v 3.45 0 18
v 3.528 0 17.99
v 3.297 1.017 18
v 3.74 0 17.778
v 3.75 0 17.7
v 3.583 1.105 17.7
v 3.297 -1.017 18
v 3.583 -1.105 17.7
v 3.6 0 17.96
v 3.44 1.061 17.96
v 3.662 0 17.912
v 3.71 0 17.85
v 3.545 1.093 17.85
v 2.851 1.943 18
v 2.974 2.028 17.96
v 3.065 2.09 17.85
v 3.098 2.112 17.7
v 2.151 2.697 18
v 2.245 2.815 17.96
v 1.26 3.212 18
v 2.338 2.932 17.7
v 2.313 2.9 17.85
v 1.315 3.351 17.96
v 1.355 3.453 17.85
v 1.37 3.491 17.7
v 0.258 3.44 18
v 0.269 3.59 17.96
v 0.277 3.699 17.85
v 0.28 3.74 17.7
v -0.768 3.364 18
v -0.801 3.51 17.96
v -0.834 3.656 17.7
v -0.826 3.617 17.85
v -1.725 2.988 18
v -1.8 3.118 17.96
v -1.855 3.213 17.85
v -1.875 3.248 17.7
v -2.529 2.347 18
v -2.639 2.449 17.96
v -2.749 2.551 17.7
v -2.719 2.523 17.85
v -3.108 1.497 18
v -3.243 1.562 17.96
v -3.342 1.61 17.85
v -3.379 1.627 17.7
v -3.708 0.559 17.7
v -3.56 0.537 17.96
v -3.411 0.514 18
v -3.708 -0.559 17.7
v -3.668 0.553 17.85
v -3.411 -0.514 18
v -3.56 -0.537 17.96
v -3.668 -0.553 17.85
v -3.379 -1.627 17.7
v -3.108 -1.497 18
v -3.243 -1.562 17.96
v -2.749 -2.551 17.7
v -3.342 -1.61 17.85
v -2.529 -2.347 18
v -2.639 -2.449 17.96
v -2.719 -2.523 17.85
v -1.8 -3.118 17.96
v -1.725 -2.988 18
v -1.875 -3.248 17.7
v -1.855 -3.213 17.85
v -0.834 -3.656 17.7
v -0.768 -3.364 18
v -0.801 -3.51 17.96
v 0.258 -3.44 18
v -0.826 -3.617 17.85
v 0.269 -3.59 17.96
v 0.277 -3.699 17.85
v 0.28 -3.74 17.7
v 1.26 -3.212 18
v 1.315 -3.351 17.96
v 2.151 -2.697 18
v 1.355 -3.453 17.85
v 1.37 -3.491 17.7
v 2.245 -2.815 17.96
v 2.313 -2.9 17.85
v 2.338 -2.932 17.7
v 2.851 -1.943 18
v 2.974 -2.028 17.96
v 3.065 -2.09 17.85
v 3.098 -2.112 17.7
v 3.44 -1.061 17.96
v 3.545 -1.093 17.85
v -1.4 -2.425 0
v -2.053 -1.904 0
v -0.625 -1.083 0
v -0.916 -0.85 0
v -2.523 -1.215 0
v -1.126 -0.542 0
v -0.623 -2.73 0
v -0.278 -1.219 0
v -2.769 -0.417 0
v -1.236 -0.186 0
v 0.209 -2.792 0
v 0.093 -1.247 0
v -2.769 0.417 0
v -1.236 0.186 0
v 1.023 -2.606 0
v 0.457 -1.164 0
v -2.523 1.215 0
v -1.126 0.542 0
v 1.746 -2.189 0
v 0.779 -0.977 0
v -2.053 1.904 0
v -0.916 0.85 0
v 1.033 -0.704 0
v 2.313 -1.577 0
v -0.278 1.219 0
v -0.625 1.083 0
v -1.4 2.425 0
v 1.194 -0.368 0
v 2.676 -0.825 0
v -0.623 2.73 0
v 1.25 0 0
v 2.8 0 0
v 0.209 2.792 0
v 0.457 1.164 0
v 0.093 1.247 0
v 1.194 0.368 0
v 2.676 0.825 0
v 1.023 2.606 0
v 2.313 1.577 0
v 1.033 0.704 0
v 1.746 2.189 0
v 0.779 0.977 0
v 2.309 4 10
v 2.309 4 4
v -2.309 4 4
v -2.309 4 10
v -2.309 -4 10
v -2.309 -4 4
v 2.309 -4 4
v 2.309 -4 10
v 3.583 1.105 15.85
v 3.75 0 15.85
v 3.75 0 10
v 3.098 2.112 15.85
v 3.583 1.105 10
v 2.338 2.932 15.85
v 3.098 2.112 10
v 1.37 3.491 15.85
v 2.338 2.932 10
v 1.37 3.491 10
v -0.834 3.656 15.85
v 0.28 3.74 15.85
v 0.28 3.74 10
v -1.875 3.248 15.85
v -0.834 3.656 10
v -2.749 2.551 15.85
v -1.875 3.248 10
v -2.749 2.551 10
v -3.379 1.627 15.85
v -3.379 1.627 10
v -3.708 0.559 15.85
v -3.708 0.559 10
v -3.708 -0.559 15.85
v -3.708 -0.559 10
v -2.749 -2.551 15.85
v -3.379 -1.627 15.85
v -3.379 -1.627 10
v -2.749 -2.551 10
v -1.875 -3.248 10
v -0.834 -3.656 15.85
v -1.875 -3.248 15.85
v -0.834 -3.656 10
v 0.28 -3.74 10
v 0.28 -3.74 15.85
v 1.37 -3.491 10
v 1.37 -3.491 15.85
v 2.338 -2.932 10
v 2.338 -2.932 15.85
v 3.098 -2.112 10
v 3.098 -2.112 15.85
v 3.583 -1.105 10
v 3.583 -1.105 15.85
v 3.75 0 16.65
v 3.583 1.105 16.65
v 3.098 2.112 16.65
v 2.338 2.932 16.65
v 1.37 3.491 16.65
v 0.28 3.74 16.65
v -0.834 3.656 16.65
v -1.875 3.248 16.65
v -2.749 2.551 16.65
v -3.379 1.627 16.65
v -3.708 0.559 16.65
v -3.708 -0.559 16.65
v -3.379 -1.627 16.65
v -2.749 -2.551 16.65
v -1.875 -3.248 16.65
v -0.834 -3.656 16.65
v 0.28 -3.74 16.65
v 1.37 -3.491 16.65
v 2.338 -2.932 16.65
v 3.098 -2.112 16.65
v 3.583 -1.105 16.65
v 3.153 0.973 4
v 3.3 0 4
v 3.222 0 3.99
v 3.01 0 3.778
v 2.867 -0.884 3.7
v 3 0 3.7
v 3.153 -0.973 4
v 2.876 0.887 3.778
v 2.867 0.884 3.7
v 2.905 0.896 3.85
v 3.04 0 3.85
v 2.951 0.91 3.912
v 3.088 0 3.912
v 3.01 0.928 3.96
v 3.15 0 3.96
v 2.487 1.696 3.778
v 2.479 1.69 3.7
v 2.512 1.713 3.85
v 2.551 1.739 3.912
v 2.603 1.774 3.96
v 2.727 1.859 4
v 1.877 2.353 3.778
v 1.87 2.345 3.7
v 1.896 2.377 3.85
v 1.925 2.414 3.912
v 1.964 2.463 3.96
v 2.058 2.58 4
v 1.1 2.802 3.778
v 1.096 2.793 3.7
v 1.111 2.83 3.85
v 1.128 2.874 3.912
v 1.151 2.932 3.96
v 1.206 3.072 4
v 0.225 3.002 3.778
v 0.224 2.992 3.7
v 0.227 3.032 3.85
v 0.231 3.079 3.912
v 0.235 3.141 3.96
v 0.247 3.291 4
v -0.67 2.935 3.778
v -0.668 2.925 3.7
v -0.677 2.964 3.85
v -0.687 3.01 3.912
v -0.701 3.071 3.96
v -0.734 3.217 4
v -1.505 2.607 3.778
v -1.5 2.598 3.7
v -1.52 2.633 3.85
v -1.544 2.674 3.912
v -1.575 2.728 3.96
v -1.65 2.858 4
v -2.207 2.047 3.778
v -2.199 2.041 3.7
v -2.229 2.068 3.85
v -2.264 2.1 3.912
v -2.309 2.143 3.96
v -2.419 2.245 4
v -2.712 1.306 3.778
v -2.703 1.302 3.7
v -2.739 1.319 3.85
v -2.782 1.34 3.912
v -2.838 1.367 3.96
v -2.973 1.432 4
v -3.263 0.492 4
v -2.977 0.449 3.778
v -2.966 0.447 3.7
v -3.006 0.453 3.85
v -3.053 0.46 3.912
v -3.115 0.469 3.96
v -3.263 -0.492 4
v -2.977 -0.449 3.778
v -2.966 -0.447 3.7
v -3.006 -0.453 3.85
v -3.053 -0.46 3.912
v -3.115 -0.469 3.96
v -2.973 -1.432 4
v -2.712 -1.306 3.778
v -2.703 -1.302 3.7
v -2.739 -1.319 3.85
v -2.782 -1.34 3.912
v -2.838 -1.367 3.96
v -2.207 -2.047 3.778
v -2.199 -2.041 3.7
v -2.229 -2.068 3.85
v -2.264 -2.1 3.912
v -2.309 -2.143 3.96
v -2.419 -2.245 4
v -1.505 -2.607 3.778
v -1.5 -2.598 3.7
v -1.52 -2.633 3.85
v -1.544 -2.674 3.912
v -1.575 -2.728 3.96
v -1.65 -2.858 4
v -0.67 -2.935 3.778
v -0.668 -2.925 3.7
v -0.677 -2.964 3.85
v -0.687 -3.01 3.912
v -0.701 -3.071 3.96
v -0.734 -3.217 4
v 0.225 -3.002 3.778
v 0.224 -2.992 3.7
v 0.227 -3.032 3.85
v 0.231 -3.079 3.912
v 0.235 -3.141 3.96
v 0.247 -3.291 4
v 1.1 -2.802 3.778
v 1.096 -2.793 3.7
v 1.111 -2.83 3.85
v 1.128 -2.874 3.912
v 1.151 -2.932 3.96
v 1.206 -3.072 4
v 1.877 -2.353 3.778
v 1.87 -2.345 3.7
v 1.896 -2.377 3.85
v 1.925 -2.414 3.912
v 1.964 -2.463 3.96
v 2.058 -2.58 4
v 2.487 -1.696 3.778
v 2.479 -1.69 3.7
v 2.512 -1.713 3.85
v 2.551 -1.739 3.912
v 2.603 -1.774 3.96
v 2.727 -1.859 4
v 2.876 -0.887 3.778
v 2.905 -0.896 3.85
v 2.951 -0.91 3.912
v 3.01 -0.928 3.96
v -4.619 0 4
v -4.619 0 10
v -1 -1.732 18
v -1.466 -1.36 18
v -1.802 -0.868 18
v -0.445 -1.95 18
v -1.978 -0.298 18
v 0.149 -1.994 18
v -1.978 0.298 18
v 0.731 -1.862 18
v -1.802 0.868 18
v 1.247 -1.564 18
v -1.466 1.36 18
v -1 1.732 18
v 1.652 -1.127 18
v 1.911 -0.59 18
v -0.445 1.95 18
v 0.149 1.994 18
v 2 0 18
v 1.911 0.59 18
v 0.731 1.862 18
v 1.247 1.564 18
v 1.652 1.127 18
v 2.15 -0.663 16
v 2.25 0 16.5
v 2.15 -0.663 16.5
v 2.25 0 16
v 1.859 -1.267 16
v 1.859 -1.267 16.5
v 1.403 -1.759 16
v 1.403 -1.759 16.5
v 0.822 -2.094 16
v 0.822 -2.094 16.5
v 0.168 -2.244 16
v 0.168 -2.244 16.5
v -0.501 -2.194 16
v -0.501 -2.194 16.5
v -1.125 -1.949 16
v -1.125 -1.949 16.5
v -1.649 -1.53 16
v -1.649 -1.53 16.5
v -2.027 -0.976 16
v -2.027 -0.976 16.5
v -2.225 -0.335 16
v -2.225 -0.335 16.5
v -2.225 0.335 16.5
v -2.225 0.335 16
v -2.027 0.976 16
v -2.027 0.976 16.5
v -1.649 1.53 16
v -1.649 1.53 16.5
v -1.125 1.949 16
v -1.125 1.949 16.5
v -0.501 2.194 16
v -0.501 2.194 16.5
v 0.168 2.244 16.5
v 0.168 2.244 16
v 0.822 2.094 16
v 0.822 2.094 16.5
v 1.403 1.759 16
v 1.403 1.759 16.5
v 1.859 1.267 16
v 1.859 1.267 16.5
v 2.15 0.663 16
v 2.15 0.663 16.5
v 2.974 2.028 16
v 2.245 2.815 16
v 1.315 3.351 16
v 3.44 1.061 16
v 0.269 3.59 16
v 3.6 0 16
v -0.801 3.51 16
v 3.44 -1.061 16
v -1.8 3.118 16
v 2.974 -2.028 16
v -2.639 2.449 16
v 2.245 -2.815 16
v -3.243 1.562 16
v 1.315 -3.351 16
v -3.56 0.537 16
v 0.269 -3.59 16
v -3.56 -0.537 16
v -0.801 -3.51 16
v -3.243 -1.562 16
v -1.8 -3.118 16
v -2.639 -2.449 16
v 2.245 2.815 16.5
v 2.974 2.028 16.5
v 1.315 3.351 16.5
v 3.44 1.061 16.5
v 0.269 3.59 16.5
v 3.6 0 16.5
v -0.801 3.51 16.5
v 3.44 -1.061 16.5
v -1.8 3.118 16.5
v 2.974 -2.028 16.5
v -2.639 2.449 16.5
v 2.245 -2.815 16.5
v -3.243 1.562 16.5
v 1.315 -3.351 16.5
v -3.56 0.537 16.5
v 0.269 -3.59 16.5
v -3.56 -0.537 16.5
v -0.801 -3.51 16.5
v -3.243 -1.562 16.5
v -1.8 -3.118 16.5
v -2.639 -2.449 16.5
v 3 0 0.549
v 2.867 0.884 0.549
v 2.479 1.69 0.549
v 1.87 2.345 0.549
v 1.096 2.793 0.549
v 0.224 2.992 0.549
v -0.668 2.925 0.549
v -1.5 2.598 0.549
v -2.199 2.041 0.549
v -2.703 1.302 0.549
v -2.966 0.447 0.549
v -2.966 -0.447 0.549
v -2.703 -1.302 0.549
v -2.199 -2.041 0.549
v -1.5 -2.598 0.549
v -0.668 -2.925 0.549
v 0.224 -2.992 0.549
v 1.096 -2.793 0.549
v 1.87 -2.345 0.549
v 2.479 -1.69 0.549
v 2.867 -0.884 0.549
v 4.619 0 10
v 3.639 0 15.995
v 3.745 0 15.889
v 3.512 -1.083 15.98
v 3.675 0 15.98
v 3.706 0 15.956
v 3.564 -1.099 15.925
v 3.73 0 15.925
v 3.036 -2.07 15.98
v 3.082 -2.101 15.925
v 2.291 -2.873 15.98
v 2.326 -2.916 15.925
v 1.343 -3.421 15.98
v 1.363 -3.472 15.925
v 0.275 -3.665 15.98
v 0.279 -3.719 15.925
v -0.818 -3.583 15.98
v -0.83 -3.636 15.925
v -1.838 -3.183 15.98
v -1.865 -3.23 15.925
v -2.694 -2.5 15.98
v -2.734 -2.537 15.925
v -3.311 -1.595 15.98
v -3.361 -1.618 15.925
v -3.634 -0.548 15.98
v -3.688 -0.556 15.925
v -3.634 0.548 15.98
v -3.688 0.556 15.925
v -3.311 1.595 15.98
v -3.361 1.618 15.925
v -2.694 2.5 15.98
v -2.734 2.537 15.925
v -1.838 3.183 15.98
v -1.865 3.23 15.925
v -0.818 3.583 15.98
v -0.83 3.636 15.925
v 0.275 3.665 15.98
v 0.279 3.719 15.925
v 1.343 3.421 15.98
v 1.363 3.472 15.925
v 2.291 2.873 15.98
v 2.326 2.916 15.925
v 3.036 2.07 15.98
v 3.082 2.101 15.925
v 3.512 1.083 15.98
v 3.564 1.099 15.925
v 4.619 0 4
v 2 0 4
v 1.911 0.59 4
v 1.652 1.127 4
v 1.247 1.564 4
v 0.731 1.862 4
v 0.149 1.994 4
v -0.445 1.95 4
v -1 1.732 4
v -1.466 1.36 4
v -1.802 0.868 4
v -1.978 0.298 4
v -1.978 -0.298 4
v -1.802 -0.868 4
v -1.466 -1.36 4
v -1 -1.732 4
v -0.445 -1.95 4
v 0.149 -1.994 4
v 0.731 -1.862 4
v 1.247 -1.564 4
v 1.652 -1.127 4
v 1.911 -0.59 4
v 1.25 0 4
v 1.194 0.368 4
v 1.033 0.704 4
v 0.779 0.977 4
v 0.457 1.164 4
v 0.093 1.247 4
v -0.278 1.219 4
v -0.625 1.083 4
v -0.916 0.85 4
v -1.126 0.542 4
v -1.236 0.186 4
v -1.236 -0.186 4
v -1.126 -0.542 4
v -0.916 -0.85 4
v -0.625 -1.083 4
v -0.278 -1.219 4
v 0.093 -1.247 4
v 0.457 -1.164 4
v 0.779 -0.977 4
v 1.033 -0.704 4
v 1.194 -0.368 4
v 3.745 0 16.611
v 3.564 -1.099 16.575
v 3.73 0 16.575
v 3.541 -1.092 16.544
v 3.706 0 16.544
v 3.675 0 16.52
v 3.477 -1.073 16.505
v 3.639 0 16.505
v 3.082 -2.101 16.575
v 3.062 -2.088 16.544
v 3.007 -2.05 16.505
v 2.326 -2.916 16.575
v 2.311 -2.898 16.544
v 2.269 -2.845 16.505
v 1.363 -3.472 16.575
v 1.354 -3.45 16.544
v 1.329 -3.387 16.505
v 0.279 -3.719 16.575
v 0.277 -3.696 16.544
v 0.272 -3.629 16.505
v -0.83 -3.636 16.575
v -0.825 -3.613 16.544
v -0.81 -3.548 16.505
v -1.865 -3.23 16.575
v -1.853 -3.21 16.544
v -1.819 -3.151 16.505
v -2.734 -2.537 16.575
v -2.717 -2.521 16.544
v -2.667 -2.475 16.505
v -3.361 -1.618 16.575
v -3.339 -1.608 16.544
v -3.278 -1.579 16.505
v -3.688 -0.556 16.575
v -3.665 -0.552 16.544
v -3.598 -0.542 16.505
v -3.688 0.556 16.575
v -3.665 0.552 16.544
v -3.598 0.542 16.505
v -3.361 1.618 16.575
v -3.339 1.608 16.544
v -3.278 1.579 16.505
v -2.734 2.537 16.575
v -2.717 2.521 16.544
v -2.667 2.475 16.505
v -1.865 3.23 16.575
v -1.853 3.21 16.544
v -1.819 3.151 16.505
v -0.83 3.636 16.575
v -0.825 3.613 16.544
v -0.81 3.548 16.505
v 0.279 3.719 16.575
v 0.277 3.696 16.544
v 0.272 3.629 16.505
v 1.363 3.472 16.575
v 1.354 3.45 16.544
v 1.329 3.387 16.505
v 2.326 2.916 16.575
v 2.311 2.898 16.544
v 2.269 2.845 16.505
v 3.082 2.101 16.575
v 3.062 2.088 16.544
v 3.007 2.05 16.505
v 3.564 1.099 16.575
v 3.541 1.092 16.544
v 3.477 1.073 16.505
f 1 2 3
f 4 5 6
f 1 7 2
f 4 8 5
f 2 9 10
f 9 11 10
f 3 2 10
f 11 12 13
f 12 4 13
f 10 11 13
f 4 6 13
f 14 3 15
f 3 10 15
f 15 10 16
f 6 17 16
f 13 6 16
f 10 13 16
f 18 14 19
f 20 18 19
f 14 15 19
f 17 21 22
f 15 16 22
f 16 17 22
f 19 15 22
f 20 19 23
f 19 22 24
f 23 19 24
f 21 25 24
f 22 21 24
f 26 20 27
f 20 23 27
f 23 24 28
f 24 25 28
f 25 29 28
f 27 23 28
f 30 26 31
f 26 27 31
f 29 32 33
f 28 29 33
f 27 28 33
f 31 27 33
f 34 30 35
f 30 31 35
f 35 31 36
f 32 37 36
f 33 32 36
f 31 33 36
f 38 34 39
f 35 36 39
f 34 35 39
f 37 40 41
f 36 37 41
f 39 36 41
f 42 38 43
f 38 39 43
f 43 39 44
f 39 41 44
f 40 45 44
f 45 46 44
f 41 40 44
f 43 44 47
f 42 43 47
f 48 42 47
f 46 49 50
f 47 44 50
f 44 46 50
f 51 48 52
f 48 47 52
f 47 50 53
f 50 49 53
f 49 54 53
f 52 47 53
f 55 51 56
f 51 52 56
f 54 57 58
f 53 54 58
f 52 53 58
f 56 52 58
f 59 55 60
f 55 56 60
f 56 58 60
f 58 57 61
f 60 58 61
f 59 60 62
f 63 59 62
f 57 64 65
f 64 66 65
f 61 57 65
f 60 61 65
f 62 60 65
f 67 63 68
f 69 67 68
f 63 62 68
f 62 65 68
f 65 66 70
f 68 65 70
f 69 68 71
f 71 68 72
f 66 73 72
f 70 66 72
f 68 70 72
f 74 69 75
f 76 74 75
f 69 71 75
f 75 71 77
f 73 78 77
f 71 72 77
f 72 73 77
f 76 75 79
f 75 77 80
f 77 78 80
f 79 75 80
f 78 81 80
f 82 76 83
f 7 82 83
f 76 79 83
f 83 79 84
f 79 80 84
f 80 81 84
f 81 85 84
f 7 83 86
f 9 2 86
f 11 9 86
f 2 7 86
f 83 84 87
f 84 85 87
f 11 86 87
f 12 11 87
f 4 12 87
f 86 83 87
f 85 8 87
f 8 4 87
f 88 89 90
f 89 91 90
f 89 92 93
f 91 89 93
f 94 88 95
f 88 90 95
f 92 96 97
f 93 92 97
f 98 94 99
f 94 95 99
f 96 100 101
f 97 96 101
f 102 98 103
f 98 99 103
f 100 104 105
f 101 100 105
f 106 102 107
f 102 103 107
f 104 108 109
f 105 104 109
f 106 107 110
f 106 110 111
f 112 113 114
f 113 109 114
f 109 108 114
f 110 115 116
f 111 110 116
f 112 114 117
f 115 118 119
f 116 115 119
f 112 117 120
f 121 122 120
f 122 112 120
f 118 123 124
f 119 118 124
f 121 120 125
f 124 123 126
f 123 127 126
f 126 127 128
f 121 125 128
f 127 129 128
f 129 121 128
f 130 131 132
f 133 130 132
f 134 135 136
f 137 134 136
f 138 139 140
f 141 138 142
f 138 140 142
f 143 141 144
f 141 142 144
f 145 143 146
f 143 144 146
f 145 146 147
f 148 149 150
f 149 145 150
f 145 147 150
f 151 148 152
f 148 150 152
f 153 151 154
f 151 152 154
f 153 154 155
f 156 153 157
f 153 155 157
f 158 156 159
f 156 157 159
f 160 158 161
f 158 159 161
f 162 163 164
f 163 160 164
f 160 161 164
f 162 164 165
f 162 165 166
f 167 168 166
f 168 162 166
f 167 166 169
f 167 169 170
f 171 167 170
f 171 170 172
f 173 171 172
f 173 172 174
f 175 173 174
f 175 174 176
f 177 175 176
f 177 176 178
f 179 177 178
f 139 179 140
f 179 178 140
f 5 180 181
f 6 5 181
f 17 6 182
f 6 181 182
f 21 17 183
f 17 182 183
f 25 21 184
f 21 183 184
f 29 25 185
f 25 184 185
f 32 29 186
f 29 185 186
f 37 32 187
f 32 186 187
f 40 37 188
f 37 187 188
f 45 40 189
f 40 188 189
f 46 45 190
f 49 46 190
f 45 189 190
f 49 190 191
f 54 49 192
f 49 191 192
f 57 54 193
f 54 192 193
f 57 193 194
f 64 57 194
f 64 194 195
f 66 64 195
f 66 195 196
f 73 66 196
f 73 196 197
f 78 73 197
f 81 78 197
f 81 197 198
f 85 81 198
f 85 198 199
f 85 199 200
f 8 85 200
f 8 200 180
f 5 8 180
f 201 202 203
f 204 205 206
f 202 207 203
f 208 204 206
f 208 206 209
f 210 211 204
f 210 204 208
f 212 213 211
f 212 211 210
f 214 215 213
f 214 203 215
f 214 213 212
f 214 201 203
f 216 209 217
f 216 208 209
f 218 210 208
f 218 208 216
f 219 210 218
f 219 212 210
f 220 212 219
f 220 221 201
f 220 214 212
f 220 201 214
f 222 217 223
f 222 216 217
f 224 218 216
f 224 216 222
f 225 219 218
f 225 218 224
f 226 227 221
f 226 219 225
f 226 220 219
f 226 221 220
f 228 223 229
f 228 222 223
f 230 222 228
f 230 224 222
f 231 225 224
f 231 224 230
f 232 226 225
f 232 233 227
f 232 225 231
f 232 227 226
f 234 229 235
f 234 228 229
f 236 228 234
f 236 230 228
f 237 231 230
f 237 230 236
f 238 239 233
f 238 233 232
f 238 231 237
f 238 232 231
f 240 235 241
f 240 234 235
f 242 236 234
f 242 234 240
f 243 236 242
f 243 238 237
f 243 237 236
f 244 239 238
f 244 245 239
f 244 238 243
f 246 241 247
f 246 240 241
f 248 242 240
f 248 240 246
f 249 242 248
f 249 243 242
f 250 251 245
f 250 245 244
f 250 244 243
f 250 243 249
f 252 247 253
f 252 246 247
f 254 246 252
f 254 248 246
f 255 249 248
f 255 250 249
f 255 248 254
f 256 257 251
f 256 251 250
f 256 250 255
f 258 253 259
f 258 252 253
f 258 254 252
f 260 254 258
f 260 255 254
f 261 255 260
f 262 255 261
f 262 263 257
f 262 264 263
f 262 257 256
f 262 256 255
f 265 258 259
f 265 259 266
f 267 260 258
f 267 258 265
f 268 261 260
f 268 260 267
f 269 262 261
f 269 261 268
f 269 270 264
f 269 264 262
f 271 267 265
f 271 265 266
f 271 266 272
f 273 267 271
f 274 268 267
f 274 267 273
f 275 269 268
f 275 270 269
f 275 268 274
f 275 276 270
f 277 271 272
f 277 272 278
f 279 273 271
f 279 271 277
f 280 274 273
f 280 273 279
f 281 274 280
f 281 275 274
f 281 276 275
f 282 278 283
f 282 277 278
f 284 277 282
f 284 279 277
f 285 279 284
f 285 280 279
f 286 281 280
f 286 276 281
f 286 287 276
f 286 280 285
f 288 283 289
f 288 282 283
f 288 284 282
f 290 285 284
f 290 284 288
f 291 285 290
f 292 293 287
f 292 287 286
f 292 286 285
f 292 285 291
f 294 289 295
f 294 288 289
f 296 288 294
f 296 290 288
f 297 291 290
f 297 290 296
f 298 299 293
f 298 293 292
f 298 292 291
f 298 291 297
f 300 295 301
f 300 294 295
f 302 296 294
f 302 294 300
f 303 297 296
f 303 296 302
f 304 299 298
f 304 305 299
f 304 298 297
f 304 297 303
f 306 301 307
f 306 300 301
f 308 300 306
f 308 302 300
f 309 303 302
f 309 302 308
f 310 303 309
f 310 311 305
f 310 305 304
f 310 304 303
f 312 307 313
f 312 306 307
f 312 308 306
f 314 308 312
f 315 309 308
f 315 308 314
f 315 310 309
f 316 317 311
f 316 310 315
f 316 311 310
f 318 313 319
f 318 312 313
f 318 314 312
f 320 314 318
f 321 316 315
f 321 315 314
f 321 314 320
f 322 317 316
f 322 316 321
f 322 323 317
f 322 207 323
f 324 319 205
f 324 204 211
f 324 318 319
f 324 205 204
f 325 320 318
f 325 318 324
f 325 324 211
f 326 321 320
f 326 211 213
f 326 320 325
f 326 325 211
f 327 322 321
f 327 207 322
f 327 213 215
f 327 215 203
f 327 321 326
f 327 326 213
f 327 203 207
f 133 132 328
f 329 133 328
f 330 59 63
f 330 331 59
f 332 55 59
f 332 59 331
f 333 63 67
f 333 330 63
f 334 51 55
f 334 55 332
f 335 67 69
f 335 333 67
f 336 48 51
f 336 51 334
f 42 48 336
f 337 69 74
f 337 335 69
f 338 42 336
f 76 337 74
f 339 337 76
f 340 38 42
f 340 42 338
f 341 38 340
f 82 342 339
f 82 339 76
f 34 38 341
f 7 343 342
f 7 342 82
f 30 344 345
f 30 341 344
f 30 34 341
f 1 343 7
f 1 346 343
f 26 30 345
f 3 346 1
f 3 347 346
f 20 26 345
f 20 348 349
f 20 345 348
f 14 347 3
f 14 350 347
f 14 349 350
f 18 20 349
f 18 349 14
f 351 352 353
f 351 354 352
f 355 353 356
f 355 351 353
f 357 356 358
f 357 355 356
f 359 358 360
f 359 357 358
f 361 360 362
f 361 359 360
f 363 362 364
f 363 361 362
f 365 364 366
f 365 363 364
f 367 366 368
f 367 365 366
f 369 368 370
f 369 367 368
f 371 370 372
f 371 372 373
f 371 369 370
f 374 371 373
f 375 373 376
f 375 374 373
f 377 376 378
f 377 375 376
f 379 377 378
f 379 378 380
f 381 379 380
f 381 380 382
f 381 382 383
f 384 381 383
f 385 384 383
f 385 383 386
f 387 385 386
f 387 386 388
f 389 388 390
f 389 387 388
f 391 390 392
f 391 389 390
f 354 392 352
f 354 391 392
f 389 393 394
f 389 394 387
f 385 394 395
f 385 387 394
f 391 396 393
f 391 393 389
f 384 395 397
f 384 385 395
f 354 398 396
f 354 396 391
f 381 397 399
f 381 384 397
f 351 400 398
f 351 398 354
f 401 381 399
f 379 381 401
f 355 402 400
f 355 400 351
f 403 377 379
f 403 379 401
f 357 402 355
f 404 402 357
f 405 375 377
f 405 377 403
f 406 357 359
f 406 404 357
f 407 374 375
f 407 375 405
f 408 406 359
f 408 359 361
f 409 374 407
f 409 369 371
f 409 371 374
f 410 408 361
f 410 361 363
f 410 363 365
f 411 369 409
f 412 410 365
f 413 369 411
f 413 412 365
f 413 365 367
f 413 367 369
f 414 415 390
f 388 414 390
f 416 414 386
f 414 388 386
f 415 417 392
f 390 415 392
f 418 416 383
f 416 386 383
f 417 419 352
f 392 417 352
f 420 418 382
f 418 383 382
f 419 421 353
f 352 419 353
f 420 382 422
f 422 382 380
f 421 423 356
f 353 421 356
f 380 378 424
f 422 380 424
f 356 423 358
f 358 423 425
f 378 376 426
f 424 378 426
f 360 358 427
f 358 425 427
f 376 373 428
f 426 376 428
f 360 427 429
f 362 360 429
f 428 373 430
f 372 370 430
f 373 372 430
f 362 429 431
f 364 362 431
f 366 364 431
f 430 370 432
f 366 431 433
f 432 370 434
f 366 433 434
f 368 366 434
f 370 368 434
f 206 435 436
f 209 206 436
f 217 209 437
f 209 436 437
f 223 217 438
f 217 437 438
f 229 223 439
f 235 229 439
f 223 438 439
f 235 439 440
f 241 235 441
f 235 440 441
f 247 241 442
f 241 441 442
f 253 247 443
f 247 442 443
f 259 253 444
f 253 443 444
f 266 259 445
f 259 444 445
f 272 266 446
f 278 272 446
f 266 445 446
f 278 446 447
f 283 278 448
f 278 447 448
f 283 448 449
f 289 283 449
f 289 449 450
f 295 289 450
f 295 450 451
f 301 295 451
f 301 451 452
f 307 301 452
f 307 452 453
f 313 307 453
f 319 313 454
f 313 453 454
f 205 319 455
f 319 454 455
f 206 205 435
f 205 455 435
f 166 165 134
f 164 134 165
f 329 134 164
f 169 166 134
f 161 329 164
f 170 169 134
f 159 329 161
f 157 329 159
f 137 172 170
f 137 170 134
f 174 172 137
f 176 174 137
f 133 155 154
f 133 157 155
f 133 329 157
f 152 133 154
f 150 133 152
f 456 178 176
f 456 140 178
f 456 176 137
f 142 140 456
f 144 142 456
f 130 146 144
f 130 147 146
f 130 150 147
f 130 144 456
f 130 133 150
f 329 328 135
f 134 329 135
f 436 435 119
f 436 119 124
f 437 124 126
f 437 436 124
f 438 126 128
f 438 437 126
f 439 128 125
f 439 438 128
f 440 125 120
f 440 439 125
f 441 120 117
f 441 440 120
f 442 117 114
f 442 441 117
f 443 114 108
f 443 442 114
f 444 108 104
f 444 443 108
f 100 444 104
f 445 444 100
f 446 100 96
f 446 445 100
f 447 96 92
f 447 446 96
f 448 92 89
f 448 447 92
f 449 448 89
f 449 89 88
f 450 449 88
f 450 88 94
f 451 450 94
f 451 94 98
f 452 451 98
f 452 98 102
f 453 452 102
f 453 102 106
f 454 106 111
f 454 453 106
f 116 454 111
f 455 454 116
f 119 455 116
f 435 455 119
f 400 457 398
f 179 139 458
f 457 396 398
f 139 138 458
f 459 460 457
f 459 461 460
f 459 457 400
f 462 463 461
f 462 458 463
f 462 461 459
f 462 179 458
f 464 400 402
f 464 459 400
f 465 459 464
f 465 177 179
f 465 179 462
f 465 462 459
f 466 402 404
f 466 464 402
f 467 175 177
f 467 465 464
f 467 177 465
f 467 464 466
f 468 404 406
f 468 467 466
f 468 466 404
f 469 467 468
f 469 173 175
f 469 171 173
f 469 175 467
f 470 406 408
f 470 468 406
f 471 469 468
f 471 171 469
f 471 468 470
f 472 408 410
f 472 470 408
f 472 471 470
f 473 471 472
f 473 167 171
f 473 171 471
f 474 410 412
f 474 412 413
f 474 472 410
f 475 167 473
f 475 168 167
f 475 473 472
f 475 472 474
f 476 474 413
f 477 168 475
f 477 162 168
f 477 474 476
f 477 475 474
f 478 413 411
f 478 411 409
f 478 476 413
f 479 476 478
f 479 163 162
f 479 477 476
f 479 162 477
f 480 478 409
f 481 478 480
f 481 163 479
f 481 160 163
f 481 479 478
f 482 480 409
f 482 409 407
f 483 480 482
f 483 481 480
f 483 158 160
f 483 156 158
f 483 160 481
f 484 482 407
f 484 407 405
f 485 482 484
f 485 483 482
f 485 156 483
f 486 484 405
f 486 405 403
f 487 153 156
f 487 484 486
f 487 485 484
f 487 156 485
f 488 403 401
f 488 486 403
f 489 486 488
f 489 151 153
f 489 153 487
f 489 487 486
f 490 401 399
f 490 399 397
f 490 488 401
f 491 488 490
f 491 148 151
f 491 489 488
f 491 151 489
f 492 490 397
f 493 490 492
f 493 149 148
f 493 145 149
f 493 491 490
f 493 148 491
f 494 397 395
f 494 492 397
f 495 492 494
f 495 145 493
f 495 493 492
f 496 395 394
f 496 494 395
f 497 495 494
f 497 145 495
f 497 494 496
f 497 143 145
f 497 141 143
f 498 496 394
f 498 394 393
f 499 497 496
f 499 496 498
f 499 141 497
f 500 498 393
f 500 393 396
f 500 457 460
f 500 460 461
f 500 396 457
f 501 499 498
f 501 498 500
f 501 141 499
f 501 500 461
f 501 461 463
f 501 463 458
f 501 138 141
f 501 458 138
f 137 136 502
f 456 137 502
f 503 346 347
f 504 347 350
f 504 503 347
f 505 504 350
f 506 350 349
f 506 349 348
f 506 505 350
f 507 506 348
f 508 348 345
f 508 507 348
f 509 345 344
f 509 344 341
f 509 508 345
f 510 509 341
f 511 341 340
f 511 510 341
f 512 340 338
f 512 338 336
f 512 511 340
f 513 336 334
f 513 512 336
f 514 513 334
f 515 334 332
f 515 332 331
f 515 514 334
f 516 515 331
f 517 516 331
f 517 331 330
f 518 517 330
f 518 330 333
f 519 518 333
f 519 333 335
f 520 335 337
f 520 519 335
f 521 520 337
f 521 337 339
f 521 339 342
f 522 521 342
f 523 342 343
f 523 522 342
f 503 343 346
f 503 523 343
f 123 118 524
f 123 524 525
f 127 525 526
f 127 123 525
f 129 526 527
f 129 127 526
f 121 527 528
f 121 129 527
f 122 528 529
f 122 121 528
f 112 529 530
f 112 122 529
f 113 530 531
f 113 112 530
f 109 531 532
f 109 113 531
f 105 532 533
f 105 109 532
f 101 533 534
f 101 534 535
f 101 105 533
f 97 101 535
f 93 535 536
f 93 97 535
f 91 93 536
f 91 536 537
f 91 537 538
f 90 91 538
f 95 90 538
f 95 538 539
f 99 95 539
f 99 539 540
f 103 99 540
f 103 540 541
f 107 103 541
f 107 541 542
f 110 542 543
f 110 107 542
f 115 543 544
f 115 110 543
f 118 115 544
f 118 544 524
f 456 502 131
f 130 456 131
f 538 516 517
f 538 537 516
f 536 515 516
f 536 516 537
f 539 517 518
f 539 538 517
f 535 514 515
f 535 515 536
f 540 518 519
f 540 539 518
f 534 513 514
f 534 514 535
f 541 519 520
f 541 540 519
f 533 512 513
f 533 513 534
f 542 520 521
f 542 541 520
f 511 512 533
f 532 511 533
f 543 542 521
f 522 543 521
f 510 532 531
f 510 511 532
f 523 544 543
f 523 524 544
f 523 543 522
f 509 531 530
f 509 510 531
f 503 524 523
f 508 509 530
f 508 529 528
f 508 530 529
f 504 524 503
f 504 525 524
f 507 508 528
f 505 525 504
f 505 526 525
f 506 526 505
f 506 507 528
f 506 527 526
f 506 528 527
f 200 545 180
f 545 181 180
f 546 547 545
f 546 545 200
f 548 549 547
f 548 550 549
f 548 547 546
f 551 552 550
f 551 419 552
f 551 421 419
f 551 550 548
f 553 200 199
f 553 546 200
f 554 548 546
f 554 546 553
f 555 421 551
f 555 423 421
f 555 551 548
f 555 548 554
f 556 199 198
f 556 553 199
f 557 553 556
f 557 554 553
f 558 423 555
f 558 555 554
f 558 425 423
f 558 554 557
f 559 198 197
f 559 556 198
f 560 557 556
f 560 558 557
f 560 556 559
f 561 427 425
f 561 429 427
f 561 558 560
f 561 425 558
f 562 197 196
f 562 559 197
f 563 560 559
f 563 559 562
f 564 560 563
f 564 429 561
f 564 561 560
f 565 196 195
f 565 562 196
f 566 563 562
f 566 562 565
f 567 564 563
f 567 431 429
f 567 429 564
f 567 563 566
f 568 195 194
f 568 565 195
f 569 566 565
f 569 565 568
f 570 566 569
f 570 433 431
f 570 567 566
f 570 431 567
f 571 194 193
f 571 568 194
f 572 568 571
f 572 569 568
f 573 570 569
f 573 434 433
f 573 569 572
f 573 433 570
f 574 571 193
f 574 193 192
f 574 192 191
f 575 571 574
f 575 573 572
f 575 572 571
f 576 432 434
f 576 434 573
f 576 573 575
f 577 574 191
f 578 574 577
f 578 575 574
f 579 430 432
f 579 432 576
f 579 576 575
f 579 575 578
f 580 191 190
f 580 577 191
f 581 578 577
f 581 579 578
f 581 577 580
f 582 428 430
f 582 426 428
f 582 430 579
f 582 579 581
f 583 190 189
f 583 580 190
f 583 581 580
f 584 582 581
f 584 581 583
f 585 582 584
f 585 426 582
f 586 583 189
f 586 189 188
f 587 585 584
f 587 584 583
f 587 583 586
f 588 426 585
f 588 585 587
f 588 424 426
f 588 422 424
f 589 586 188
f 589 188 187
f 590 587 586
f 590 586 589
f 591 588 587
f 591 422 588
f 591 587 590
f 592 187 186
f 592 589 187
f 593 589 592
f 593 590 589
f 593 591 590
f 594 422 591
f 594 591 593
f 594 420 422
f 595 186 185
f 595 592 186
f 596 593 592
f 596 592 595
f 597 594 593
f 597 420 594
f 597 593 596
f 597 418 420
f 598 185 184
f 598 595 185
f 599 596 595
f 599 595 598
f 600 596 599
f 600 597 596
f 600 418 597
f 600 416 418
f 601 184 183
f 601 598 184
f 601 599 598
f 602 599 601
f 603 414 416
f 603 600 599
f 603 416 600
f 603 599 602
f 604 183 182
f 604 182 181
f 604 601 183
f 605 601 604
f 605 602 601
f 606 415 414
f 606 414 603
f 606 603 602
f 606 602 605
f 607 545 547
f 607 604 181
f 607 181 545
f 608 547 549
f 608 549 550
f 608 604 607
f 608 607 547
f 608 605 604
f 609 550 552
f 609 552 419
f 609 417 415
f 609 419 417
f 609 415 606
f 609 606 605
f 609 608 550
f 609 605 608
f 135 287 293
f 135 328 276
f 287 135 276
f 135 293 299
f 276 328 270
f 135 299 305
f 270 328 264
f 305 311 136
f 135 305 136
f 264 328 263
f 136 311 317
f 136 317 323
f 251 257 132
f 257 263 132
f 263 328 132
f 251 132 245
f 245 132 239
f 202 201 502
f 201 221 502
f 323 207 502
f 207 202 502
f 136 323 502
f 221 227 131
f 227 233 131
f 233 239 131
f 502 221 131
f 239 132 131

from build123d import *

# Parameters (mm, degrees)
ESQUISSE1_R        = 3
ESQUISSE1_R_2      = 1.25
BOSS_EXTRU_1_DEPTH = 4
CHANFREIN1_SIZE    = 0.2
CHANFREIN1_SIZE2   = 0.549495484
ESQUISSE2_R        = 2
BOSS_EXTRU_2_DEPTH = 6
ESQUISSE3_R        = 3.75
ESQUISSE3_R_2      = 2
BOSS_EXTRU_3_DEPTH = 8
CONG_3_R           = 0.3
ESQUISSE4_W        = 1.5
ESQUISSE4_H        = 0.5
CONG_4_R           = 0.3
CONG_5_R           = 0.15


with BuildPart() as part:
    # Esquisse1 → Boss.-Extru.1 (new body)
    with BuildSketch(Plane.XY):
        Circle(ESQUISSE1_R)
        Circle(ESQUISSE1_R_2, mode=Mode.SUBTRACT)
    extrude(amount=BOSS_EXTRU_1_DEPTH)

    # Chanfrein1
    chanfrein1_edges = [part.edges().sort_by_distance(p)[0] for p in [
        (-3, 0, 0),
    ]]
    chanfrein1_side = [part.faces().sort_by_distance(p)[0] for p in [
        (-2.915147186, 0, 0),
    ]]
    chamfer(chanfrein1_edges, length=CHANFREIN1_SIZE, length2=CHANFREIN1_SIZE2, reference=chanfrein1_side[0])

    # Esquisse2 → Boss.-Extru.2 (add)
    with BuildSketch(Plane.XY.offset(4)):
        Polygon((2.309401077, -4), (4.618802154, 0), (2.309401077, 4), (-2.309401077, 4), (-4.618802154, 0), (-2.309401077, -4), align=None)
        Circle(ESQUISSE2_R, mode=Mode.SUBTRACT)
    extrude(amount=BOSS_EXTRU_2_DEPTH)

    # Esquisse3 → Boss.-Extru.3 (add)
    with BuildSketch(Plane.XY.offset(10)):
        Circle(ESQUISSE3_R)
        Circle(ESQUISSE3_R_2, mode=Mode.SUBTRACT)
    extrude(amount=BOSS_EXTRU_3_DEPTH)

    # Congé3
    cong_3_edges = [part.edges().sort_by_distance(p)[0] for p in [
        (-3, 0, 4),
    ]]
    fillet(cong_3_edges, radius=CONG_3_R)

    # Esquisse4 → Enlèvement de matière-Révolution1 (revolve, cut)
    with BuildSketch(Plane(origin=(0, 0, 0), x_dir=(1, 0, 0), z_dir=(0, 1, 0))):
        with Locations((3, -16.25)):
            Rectangle(ESQUISSE4_W, ESQUISSE4_H)
    revolve(axis=Axis((0, 0, 52.241443479), (0, 0, -1)), mode=Mode.SUBTRACT)

    # Congé4
    cong_4_edges = [part.edges().sort_by_distance(p)[0] for p in [
        (-3.75, 0, 18),
    ]]
    fillet(cong_4_edges, radius=CONG_4_R)

    # Congé5
    cong_5_edges = [part.edges().sort_by_distance(p)[0] for p in [
        (-3.75, 0, 16),
        (-3.75, 0, 16.5),
    ]]
    fillet(cong_5_edges, radius=CONG_5_R)


solid = part.part
